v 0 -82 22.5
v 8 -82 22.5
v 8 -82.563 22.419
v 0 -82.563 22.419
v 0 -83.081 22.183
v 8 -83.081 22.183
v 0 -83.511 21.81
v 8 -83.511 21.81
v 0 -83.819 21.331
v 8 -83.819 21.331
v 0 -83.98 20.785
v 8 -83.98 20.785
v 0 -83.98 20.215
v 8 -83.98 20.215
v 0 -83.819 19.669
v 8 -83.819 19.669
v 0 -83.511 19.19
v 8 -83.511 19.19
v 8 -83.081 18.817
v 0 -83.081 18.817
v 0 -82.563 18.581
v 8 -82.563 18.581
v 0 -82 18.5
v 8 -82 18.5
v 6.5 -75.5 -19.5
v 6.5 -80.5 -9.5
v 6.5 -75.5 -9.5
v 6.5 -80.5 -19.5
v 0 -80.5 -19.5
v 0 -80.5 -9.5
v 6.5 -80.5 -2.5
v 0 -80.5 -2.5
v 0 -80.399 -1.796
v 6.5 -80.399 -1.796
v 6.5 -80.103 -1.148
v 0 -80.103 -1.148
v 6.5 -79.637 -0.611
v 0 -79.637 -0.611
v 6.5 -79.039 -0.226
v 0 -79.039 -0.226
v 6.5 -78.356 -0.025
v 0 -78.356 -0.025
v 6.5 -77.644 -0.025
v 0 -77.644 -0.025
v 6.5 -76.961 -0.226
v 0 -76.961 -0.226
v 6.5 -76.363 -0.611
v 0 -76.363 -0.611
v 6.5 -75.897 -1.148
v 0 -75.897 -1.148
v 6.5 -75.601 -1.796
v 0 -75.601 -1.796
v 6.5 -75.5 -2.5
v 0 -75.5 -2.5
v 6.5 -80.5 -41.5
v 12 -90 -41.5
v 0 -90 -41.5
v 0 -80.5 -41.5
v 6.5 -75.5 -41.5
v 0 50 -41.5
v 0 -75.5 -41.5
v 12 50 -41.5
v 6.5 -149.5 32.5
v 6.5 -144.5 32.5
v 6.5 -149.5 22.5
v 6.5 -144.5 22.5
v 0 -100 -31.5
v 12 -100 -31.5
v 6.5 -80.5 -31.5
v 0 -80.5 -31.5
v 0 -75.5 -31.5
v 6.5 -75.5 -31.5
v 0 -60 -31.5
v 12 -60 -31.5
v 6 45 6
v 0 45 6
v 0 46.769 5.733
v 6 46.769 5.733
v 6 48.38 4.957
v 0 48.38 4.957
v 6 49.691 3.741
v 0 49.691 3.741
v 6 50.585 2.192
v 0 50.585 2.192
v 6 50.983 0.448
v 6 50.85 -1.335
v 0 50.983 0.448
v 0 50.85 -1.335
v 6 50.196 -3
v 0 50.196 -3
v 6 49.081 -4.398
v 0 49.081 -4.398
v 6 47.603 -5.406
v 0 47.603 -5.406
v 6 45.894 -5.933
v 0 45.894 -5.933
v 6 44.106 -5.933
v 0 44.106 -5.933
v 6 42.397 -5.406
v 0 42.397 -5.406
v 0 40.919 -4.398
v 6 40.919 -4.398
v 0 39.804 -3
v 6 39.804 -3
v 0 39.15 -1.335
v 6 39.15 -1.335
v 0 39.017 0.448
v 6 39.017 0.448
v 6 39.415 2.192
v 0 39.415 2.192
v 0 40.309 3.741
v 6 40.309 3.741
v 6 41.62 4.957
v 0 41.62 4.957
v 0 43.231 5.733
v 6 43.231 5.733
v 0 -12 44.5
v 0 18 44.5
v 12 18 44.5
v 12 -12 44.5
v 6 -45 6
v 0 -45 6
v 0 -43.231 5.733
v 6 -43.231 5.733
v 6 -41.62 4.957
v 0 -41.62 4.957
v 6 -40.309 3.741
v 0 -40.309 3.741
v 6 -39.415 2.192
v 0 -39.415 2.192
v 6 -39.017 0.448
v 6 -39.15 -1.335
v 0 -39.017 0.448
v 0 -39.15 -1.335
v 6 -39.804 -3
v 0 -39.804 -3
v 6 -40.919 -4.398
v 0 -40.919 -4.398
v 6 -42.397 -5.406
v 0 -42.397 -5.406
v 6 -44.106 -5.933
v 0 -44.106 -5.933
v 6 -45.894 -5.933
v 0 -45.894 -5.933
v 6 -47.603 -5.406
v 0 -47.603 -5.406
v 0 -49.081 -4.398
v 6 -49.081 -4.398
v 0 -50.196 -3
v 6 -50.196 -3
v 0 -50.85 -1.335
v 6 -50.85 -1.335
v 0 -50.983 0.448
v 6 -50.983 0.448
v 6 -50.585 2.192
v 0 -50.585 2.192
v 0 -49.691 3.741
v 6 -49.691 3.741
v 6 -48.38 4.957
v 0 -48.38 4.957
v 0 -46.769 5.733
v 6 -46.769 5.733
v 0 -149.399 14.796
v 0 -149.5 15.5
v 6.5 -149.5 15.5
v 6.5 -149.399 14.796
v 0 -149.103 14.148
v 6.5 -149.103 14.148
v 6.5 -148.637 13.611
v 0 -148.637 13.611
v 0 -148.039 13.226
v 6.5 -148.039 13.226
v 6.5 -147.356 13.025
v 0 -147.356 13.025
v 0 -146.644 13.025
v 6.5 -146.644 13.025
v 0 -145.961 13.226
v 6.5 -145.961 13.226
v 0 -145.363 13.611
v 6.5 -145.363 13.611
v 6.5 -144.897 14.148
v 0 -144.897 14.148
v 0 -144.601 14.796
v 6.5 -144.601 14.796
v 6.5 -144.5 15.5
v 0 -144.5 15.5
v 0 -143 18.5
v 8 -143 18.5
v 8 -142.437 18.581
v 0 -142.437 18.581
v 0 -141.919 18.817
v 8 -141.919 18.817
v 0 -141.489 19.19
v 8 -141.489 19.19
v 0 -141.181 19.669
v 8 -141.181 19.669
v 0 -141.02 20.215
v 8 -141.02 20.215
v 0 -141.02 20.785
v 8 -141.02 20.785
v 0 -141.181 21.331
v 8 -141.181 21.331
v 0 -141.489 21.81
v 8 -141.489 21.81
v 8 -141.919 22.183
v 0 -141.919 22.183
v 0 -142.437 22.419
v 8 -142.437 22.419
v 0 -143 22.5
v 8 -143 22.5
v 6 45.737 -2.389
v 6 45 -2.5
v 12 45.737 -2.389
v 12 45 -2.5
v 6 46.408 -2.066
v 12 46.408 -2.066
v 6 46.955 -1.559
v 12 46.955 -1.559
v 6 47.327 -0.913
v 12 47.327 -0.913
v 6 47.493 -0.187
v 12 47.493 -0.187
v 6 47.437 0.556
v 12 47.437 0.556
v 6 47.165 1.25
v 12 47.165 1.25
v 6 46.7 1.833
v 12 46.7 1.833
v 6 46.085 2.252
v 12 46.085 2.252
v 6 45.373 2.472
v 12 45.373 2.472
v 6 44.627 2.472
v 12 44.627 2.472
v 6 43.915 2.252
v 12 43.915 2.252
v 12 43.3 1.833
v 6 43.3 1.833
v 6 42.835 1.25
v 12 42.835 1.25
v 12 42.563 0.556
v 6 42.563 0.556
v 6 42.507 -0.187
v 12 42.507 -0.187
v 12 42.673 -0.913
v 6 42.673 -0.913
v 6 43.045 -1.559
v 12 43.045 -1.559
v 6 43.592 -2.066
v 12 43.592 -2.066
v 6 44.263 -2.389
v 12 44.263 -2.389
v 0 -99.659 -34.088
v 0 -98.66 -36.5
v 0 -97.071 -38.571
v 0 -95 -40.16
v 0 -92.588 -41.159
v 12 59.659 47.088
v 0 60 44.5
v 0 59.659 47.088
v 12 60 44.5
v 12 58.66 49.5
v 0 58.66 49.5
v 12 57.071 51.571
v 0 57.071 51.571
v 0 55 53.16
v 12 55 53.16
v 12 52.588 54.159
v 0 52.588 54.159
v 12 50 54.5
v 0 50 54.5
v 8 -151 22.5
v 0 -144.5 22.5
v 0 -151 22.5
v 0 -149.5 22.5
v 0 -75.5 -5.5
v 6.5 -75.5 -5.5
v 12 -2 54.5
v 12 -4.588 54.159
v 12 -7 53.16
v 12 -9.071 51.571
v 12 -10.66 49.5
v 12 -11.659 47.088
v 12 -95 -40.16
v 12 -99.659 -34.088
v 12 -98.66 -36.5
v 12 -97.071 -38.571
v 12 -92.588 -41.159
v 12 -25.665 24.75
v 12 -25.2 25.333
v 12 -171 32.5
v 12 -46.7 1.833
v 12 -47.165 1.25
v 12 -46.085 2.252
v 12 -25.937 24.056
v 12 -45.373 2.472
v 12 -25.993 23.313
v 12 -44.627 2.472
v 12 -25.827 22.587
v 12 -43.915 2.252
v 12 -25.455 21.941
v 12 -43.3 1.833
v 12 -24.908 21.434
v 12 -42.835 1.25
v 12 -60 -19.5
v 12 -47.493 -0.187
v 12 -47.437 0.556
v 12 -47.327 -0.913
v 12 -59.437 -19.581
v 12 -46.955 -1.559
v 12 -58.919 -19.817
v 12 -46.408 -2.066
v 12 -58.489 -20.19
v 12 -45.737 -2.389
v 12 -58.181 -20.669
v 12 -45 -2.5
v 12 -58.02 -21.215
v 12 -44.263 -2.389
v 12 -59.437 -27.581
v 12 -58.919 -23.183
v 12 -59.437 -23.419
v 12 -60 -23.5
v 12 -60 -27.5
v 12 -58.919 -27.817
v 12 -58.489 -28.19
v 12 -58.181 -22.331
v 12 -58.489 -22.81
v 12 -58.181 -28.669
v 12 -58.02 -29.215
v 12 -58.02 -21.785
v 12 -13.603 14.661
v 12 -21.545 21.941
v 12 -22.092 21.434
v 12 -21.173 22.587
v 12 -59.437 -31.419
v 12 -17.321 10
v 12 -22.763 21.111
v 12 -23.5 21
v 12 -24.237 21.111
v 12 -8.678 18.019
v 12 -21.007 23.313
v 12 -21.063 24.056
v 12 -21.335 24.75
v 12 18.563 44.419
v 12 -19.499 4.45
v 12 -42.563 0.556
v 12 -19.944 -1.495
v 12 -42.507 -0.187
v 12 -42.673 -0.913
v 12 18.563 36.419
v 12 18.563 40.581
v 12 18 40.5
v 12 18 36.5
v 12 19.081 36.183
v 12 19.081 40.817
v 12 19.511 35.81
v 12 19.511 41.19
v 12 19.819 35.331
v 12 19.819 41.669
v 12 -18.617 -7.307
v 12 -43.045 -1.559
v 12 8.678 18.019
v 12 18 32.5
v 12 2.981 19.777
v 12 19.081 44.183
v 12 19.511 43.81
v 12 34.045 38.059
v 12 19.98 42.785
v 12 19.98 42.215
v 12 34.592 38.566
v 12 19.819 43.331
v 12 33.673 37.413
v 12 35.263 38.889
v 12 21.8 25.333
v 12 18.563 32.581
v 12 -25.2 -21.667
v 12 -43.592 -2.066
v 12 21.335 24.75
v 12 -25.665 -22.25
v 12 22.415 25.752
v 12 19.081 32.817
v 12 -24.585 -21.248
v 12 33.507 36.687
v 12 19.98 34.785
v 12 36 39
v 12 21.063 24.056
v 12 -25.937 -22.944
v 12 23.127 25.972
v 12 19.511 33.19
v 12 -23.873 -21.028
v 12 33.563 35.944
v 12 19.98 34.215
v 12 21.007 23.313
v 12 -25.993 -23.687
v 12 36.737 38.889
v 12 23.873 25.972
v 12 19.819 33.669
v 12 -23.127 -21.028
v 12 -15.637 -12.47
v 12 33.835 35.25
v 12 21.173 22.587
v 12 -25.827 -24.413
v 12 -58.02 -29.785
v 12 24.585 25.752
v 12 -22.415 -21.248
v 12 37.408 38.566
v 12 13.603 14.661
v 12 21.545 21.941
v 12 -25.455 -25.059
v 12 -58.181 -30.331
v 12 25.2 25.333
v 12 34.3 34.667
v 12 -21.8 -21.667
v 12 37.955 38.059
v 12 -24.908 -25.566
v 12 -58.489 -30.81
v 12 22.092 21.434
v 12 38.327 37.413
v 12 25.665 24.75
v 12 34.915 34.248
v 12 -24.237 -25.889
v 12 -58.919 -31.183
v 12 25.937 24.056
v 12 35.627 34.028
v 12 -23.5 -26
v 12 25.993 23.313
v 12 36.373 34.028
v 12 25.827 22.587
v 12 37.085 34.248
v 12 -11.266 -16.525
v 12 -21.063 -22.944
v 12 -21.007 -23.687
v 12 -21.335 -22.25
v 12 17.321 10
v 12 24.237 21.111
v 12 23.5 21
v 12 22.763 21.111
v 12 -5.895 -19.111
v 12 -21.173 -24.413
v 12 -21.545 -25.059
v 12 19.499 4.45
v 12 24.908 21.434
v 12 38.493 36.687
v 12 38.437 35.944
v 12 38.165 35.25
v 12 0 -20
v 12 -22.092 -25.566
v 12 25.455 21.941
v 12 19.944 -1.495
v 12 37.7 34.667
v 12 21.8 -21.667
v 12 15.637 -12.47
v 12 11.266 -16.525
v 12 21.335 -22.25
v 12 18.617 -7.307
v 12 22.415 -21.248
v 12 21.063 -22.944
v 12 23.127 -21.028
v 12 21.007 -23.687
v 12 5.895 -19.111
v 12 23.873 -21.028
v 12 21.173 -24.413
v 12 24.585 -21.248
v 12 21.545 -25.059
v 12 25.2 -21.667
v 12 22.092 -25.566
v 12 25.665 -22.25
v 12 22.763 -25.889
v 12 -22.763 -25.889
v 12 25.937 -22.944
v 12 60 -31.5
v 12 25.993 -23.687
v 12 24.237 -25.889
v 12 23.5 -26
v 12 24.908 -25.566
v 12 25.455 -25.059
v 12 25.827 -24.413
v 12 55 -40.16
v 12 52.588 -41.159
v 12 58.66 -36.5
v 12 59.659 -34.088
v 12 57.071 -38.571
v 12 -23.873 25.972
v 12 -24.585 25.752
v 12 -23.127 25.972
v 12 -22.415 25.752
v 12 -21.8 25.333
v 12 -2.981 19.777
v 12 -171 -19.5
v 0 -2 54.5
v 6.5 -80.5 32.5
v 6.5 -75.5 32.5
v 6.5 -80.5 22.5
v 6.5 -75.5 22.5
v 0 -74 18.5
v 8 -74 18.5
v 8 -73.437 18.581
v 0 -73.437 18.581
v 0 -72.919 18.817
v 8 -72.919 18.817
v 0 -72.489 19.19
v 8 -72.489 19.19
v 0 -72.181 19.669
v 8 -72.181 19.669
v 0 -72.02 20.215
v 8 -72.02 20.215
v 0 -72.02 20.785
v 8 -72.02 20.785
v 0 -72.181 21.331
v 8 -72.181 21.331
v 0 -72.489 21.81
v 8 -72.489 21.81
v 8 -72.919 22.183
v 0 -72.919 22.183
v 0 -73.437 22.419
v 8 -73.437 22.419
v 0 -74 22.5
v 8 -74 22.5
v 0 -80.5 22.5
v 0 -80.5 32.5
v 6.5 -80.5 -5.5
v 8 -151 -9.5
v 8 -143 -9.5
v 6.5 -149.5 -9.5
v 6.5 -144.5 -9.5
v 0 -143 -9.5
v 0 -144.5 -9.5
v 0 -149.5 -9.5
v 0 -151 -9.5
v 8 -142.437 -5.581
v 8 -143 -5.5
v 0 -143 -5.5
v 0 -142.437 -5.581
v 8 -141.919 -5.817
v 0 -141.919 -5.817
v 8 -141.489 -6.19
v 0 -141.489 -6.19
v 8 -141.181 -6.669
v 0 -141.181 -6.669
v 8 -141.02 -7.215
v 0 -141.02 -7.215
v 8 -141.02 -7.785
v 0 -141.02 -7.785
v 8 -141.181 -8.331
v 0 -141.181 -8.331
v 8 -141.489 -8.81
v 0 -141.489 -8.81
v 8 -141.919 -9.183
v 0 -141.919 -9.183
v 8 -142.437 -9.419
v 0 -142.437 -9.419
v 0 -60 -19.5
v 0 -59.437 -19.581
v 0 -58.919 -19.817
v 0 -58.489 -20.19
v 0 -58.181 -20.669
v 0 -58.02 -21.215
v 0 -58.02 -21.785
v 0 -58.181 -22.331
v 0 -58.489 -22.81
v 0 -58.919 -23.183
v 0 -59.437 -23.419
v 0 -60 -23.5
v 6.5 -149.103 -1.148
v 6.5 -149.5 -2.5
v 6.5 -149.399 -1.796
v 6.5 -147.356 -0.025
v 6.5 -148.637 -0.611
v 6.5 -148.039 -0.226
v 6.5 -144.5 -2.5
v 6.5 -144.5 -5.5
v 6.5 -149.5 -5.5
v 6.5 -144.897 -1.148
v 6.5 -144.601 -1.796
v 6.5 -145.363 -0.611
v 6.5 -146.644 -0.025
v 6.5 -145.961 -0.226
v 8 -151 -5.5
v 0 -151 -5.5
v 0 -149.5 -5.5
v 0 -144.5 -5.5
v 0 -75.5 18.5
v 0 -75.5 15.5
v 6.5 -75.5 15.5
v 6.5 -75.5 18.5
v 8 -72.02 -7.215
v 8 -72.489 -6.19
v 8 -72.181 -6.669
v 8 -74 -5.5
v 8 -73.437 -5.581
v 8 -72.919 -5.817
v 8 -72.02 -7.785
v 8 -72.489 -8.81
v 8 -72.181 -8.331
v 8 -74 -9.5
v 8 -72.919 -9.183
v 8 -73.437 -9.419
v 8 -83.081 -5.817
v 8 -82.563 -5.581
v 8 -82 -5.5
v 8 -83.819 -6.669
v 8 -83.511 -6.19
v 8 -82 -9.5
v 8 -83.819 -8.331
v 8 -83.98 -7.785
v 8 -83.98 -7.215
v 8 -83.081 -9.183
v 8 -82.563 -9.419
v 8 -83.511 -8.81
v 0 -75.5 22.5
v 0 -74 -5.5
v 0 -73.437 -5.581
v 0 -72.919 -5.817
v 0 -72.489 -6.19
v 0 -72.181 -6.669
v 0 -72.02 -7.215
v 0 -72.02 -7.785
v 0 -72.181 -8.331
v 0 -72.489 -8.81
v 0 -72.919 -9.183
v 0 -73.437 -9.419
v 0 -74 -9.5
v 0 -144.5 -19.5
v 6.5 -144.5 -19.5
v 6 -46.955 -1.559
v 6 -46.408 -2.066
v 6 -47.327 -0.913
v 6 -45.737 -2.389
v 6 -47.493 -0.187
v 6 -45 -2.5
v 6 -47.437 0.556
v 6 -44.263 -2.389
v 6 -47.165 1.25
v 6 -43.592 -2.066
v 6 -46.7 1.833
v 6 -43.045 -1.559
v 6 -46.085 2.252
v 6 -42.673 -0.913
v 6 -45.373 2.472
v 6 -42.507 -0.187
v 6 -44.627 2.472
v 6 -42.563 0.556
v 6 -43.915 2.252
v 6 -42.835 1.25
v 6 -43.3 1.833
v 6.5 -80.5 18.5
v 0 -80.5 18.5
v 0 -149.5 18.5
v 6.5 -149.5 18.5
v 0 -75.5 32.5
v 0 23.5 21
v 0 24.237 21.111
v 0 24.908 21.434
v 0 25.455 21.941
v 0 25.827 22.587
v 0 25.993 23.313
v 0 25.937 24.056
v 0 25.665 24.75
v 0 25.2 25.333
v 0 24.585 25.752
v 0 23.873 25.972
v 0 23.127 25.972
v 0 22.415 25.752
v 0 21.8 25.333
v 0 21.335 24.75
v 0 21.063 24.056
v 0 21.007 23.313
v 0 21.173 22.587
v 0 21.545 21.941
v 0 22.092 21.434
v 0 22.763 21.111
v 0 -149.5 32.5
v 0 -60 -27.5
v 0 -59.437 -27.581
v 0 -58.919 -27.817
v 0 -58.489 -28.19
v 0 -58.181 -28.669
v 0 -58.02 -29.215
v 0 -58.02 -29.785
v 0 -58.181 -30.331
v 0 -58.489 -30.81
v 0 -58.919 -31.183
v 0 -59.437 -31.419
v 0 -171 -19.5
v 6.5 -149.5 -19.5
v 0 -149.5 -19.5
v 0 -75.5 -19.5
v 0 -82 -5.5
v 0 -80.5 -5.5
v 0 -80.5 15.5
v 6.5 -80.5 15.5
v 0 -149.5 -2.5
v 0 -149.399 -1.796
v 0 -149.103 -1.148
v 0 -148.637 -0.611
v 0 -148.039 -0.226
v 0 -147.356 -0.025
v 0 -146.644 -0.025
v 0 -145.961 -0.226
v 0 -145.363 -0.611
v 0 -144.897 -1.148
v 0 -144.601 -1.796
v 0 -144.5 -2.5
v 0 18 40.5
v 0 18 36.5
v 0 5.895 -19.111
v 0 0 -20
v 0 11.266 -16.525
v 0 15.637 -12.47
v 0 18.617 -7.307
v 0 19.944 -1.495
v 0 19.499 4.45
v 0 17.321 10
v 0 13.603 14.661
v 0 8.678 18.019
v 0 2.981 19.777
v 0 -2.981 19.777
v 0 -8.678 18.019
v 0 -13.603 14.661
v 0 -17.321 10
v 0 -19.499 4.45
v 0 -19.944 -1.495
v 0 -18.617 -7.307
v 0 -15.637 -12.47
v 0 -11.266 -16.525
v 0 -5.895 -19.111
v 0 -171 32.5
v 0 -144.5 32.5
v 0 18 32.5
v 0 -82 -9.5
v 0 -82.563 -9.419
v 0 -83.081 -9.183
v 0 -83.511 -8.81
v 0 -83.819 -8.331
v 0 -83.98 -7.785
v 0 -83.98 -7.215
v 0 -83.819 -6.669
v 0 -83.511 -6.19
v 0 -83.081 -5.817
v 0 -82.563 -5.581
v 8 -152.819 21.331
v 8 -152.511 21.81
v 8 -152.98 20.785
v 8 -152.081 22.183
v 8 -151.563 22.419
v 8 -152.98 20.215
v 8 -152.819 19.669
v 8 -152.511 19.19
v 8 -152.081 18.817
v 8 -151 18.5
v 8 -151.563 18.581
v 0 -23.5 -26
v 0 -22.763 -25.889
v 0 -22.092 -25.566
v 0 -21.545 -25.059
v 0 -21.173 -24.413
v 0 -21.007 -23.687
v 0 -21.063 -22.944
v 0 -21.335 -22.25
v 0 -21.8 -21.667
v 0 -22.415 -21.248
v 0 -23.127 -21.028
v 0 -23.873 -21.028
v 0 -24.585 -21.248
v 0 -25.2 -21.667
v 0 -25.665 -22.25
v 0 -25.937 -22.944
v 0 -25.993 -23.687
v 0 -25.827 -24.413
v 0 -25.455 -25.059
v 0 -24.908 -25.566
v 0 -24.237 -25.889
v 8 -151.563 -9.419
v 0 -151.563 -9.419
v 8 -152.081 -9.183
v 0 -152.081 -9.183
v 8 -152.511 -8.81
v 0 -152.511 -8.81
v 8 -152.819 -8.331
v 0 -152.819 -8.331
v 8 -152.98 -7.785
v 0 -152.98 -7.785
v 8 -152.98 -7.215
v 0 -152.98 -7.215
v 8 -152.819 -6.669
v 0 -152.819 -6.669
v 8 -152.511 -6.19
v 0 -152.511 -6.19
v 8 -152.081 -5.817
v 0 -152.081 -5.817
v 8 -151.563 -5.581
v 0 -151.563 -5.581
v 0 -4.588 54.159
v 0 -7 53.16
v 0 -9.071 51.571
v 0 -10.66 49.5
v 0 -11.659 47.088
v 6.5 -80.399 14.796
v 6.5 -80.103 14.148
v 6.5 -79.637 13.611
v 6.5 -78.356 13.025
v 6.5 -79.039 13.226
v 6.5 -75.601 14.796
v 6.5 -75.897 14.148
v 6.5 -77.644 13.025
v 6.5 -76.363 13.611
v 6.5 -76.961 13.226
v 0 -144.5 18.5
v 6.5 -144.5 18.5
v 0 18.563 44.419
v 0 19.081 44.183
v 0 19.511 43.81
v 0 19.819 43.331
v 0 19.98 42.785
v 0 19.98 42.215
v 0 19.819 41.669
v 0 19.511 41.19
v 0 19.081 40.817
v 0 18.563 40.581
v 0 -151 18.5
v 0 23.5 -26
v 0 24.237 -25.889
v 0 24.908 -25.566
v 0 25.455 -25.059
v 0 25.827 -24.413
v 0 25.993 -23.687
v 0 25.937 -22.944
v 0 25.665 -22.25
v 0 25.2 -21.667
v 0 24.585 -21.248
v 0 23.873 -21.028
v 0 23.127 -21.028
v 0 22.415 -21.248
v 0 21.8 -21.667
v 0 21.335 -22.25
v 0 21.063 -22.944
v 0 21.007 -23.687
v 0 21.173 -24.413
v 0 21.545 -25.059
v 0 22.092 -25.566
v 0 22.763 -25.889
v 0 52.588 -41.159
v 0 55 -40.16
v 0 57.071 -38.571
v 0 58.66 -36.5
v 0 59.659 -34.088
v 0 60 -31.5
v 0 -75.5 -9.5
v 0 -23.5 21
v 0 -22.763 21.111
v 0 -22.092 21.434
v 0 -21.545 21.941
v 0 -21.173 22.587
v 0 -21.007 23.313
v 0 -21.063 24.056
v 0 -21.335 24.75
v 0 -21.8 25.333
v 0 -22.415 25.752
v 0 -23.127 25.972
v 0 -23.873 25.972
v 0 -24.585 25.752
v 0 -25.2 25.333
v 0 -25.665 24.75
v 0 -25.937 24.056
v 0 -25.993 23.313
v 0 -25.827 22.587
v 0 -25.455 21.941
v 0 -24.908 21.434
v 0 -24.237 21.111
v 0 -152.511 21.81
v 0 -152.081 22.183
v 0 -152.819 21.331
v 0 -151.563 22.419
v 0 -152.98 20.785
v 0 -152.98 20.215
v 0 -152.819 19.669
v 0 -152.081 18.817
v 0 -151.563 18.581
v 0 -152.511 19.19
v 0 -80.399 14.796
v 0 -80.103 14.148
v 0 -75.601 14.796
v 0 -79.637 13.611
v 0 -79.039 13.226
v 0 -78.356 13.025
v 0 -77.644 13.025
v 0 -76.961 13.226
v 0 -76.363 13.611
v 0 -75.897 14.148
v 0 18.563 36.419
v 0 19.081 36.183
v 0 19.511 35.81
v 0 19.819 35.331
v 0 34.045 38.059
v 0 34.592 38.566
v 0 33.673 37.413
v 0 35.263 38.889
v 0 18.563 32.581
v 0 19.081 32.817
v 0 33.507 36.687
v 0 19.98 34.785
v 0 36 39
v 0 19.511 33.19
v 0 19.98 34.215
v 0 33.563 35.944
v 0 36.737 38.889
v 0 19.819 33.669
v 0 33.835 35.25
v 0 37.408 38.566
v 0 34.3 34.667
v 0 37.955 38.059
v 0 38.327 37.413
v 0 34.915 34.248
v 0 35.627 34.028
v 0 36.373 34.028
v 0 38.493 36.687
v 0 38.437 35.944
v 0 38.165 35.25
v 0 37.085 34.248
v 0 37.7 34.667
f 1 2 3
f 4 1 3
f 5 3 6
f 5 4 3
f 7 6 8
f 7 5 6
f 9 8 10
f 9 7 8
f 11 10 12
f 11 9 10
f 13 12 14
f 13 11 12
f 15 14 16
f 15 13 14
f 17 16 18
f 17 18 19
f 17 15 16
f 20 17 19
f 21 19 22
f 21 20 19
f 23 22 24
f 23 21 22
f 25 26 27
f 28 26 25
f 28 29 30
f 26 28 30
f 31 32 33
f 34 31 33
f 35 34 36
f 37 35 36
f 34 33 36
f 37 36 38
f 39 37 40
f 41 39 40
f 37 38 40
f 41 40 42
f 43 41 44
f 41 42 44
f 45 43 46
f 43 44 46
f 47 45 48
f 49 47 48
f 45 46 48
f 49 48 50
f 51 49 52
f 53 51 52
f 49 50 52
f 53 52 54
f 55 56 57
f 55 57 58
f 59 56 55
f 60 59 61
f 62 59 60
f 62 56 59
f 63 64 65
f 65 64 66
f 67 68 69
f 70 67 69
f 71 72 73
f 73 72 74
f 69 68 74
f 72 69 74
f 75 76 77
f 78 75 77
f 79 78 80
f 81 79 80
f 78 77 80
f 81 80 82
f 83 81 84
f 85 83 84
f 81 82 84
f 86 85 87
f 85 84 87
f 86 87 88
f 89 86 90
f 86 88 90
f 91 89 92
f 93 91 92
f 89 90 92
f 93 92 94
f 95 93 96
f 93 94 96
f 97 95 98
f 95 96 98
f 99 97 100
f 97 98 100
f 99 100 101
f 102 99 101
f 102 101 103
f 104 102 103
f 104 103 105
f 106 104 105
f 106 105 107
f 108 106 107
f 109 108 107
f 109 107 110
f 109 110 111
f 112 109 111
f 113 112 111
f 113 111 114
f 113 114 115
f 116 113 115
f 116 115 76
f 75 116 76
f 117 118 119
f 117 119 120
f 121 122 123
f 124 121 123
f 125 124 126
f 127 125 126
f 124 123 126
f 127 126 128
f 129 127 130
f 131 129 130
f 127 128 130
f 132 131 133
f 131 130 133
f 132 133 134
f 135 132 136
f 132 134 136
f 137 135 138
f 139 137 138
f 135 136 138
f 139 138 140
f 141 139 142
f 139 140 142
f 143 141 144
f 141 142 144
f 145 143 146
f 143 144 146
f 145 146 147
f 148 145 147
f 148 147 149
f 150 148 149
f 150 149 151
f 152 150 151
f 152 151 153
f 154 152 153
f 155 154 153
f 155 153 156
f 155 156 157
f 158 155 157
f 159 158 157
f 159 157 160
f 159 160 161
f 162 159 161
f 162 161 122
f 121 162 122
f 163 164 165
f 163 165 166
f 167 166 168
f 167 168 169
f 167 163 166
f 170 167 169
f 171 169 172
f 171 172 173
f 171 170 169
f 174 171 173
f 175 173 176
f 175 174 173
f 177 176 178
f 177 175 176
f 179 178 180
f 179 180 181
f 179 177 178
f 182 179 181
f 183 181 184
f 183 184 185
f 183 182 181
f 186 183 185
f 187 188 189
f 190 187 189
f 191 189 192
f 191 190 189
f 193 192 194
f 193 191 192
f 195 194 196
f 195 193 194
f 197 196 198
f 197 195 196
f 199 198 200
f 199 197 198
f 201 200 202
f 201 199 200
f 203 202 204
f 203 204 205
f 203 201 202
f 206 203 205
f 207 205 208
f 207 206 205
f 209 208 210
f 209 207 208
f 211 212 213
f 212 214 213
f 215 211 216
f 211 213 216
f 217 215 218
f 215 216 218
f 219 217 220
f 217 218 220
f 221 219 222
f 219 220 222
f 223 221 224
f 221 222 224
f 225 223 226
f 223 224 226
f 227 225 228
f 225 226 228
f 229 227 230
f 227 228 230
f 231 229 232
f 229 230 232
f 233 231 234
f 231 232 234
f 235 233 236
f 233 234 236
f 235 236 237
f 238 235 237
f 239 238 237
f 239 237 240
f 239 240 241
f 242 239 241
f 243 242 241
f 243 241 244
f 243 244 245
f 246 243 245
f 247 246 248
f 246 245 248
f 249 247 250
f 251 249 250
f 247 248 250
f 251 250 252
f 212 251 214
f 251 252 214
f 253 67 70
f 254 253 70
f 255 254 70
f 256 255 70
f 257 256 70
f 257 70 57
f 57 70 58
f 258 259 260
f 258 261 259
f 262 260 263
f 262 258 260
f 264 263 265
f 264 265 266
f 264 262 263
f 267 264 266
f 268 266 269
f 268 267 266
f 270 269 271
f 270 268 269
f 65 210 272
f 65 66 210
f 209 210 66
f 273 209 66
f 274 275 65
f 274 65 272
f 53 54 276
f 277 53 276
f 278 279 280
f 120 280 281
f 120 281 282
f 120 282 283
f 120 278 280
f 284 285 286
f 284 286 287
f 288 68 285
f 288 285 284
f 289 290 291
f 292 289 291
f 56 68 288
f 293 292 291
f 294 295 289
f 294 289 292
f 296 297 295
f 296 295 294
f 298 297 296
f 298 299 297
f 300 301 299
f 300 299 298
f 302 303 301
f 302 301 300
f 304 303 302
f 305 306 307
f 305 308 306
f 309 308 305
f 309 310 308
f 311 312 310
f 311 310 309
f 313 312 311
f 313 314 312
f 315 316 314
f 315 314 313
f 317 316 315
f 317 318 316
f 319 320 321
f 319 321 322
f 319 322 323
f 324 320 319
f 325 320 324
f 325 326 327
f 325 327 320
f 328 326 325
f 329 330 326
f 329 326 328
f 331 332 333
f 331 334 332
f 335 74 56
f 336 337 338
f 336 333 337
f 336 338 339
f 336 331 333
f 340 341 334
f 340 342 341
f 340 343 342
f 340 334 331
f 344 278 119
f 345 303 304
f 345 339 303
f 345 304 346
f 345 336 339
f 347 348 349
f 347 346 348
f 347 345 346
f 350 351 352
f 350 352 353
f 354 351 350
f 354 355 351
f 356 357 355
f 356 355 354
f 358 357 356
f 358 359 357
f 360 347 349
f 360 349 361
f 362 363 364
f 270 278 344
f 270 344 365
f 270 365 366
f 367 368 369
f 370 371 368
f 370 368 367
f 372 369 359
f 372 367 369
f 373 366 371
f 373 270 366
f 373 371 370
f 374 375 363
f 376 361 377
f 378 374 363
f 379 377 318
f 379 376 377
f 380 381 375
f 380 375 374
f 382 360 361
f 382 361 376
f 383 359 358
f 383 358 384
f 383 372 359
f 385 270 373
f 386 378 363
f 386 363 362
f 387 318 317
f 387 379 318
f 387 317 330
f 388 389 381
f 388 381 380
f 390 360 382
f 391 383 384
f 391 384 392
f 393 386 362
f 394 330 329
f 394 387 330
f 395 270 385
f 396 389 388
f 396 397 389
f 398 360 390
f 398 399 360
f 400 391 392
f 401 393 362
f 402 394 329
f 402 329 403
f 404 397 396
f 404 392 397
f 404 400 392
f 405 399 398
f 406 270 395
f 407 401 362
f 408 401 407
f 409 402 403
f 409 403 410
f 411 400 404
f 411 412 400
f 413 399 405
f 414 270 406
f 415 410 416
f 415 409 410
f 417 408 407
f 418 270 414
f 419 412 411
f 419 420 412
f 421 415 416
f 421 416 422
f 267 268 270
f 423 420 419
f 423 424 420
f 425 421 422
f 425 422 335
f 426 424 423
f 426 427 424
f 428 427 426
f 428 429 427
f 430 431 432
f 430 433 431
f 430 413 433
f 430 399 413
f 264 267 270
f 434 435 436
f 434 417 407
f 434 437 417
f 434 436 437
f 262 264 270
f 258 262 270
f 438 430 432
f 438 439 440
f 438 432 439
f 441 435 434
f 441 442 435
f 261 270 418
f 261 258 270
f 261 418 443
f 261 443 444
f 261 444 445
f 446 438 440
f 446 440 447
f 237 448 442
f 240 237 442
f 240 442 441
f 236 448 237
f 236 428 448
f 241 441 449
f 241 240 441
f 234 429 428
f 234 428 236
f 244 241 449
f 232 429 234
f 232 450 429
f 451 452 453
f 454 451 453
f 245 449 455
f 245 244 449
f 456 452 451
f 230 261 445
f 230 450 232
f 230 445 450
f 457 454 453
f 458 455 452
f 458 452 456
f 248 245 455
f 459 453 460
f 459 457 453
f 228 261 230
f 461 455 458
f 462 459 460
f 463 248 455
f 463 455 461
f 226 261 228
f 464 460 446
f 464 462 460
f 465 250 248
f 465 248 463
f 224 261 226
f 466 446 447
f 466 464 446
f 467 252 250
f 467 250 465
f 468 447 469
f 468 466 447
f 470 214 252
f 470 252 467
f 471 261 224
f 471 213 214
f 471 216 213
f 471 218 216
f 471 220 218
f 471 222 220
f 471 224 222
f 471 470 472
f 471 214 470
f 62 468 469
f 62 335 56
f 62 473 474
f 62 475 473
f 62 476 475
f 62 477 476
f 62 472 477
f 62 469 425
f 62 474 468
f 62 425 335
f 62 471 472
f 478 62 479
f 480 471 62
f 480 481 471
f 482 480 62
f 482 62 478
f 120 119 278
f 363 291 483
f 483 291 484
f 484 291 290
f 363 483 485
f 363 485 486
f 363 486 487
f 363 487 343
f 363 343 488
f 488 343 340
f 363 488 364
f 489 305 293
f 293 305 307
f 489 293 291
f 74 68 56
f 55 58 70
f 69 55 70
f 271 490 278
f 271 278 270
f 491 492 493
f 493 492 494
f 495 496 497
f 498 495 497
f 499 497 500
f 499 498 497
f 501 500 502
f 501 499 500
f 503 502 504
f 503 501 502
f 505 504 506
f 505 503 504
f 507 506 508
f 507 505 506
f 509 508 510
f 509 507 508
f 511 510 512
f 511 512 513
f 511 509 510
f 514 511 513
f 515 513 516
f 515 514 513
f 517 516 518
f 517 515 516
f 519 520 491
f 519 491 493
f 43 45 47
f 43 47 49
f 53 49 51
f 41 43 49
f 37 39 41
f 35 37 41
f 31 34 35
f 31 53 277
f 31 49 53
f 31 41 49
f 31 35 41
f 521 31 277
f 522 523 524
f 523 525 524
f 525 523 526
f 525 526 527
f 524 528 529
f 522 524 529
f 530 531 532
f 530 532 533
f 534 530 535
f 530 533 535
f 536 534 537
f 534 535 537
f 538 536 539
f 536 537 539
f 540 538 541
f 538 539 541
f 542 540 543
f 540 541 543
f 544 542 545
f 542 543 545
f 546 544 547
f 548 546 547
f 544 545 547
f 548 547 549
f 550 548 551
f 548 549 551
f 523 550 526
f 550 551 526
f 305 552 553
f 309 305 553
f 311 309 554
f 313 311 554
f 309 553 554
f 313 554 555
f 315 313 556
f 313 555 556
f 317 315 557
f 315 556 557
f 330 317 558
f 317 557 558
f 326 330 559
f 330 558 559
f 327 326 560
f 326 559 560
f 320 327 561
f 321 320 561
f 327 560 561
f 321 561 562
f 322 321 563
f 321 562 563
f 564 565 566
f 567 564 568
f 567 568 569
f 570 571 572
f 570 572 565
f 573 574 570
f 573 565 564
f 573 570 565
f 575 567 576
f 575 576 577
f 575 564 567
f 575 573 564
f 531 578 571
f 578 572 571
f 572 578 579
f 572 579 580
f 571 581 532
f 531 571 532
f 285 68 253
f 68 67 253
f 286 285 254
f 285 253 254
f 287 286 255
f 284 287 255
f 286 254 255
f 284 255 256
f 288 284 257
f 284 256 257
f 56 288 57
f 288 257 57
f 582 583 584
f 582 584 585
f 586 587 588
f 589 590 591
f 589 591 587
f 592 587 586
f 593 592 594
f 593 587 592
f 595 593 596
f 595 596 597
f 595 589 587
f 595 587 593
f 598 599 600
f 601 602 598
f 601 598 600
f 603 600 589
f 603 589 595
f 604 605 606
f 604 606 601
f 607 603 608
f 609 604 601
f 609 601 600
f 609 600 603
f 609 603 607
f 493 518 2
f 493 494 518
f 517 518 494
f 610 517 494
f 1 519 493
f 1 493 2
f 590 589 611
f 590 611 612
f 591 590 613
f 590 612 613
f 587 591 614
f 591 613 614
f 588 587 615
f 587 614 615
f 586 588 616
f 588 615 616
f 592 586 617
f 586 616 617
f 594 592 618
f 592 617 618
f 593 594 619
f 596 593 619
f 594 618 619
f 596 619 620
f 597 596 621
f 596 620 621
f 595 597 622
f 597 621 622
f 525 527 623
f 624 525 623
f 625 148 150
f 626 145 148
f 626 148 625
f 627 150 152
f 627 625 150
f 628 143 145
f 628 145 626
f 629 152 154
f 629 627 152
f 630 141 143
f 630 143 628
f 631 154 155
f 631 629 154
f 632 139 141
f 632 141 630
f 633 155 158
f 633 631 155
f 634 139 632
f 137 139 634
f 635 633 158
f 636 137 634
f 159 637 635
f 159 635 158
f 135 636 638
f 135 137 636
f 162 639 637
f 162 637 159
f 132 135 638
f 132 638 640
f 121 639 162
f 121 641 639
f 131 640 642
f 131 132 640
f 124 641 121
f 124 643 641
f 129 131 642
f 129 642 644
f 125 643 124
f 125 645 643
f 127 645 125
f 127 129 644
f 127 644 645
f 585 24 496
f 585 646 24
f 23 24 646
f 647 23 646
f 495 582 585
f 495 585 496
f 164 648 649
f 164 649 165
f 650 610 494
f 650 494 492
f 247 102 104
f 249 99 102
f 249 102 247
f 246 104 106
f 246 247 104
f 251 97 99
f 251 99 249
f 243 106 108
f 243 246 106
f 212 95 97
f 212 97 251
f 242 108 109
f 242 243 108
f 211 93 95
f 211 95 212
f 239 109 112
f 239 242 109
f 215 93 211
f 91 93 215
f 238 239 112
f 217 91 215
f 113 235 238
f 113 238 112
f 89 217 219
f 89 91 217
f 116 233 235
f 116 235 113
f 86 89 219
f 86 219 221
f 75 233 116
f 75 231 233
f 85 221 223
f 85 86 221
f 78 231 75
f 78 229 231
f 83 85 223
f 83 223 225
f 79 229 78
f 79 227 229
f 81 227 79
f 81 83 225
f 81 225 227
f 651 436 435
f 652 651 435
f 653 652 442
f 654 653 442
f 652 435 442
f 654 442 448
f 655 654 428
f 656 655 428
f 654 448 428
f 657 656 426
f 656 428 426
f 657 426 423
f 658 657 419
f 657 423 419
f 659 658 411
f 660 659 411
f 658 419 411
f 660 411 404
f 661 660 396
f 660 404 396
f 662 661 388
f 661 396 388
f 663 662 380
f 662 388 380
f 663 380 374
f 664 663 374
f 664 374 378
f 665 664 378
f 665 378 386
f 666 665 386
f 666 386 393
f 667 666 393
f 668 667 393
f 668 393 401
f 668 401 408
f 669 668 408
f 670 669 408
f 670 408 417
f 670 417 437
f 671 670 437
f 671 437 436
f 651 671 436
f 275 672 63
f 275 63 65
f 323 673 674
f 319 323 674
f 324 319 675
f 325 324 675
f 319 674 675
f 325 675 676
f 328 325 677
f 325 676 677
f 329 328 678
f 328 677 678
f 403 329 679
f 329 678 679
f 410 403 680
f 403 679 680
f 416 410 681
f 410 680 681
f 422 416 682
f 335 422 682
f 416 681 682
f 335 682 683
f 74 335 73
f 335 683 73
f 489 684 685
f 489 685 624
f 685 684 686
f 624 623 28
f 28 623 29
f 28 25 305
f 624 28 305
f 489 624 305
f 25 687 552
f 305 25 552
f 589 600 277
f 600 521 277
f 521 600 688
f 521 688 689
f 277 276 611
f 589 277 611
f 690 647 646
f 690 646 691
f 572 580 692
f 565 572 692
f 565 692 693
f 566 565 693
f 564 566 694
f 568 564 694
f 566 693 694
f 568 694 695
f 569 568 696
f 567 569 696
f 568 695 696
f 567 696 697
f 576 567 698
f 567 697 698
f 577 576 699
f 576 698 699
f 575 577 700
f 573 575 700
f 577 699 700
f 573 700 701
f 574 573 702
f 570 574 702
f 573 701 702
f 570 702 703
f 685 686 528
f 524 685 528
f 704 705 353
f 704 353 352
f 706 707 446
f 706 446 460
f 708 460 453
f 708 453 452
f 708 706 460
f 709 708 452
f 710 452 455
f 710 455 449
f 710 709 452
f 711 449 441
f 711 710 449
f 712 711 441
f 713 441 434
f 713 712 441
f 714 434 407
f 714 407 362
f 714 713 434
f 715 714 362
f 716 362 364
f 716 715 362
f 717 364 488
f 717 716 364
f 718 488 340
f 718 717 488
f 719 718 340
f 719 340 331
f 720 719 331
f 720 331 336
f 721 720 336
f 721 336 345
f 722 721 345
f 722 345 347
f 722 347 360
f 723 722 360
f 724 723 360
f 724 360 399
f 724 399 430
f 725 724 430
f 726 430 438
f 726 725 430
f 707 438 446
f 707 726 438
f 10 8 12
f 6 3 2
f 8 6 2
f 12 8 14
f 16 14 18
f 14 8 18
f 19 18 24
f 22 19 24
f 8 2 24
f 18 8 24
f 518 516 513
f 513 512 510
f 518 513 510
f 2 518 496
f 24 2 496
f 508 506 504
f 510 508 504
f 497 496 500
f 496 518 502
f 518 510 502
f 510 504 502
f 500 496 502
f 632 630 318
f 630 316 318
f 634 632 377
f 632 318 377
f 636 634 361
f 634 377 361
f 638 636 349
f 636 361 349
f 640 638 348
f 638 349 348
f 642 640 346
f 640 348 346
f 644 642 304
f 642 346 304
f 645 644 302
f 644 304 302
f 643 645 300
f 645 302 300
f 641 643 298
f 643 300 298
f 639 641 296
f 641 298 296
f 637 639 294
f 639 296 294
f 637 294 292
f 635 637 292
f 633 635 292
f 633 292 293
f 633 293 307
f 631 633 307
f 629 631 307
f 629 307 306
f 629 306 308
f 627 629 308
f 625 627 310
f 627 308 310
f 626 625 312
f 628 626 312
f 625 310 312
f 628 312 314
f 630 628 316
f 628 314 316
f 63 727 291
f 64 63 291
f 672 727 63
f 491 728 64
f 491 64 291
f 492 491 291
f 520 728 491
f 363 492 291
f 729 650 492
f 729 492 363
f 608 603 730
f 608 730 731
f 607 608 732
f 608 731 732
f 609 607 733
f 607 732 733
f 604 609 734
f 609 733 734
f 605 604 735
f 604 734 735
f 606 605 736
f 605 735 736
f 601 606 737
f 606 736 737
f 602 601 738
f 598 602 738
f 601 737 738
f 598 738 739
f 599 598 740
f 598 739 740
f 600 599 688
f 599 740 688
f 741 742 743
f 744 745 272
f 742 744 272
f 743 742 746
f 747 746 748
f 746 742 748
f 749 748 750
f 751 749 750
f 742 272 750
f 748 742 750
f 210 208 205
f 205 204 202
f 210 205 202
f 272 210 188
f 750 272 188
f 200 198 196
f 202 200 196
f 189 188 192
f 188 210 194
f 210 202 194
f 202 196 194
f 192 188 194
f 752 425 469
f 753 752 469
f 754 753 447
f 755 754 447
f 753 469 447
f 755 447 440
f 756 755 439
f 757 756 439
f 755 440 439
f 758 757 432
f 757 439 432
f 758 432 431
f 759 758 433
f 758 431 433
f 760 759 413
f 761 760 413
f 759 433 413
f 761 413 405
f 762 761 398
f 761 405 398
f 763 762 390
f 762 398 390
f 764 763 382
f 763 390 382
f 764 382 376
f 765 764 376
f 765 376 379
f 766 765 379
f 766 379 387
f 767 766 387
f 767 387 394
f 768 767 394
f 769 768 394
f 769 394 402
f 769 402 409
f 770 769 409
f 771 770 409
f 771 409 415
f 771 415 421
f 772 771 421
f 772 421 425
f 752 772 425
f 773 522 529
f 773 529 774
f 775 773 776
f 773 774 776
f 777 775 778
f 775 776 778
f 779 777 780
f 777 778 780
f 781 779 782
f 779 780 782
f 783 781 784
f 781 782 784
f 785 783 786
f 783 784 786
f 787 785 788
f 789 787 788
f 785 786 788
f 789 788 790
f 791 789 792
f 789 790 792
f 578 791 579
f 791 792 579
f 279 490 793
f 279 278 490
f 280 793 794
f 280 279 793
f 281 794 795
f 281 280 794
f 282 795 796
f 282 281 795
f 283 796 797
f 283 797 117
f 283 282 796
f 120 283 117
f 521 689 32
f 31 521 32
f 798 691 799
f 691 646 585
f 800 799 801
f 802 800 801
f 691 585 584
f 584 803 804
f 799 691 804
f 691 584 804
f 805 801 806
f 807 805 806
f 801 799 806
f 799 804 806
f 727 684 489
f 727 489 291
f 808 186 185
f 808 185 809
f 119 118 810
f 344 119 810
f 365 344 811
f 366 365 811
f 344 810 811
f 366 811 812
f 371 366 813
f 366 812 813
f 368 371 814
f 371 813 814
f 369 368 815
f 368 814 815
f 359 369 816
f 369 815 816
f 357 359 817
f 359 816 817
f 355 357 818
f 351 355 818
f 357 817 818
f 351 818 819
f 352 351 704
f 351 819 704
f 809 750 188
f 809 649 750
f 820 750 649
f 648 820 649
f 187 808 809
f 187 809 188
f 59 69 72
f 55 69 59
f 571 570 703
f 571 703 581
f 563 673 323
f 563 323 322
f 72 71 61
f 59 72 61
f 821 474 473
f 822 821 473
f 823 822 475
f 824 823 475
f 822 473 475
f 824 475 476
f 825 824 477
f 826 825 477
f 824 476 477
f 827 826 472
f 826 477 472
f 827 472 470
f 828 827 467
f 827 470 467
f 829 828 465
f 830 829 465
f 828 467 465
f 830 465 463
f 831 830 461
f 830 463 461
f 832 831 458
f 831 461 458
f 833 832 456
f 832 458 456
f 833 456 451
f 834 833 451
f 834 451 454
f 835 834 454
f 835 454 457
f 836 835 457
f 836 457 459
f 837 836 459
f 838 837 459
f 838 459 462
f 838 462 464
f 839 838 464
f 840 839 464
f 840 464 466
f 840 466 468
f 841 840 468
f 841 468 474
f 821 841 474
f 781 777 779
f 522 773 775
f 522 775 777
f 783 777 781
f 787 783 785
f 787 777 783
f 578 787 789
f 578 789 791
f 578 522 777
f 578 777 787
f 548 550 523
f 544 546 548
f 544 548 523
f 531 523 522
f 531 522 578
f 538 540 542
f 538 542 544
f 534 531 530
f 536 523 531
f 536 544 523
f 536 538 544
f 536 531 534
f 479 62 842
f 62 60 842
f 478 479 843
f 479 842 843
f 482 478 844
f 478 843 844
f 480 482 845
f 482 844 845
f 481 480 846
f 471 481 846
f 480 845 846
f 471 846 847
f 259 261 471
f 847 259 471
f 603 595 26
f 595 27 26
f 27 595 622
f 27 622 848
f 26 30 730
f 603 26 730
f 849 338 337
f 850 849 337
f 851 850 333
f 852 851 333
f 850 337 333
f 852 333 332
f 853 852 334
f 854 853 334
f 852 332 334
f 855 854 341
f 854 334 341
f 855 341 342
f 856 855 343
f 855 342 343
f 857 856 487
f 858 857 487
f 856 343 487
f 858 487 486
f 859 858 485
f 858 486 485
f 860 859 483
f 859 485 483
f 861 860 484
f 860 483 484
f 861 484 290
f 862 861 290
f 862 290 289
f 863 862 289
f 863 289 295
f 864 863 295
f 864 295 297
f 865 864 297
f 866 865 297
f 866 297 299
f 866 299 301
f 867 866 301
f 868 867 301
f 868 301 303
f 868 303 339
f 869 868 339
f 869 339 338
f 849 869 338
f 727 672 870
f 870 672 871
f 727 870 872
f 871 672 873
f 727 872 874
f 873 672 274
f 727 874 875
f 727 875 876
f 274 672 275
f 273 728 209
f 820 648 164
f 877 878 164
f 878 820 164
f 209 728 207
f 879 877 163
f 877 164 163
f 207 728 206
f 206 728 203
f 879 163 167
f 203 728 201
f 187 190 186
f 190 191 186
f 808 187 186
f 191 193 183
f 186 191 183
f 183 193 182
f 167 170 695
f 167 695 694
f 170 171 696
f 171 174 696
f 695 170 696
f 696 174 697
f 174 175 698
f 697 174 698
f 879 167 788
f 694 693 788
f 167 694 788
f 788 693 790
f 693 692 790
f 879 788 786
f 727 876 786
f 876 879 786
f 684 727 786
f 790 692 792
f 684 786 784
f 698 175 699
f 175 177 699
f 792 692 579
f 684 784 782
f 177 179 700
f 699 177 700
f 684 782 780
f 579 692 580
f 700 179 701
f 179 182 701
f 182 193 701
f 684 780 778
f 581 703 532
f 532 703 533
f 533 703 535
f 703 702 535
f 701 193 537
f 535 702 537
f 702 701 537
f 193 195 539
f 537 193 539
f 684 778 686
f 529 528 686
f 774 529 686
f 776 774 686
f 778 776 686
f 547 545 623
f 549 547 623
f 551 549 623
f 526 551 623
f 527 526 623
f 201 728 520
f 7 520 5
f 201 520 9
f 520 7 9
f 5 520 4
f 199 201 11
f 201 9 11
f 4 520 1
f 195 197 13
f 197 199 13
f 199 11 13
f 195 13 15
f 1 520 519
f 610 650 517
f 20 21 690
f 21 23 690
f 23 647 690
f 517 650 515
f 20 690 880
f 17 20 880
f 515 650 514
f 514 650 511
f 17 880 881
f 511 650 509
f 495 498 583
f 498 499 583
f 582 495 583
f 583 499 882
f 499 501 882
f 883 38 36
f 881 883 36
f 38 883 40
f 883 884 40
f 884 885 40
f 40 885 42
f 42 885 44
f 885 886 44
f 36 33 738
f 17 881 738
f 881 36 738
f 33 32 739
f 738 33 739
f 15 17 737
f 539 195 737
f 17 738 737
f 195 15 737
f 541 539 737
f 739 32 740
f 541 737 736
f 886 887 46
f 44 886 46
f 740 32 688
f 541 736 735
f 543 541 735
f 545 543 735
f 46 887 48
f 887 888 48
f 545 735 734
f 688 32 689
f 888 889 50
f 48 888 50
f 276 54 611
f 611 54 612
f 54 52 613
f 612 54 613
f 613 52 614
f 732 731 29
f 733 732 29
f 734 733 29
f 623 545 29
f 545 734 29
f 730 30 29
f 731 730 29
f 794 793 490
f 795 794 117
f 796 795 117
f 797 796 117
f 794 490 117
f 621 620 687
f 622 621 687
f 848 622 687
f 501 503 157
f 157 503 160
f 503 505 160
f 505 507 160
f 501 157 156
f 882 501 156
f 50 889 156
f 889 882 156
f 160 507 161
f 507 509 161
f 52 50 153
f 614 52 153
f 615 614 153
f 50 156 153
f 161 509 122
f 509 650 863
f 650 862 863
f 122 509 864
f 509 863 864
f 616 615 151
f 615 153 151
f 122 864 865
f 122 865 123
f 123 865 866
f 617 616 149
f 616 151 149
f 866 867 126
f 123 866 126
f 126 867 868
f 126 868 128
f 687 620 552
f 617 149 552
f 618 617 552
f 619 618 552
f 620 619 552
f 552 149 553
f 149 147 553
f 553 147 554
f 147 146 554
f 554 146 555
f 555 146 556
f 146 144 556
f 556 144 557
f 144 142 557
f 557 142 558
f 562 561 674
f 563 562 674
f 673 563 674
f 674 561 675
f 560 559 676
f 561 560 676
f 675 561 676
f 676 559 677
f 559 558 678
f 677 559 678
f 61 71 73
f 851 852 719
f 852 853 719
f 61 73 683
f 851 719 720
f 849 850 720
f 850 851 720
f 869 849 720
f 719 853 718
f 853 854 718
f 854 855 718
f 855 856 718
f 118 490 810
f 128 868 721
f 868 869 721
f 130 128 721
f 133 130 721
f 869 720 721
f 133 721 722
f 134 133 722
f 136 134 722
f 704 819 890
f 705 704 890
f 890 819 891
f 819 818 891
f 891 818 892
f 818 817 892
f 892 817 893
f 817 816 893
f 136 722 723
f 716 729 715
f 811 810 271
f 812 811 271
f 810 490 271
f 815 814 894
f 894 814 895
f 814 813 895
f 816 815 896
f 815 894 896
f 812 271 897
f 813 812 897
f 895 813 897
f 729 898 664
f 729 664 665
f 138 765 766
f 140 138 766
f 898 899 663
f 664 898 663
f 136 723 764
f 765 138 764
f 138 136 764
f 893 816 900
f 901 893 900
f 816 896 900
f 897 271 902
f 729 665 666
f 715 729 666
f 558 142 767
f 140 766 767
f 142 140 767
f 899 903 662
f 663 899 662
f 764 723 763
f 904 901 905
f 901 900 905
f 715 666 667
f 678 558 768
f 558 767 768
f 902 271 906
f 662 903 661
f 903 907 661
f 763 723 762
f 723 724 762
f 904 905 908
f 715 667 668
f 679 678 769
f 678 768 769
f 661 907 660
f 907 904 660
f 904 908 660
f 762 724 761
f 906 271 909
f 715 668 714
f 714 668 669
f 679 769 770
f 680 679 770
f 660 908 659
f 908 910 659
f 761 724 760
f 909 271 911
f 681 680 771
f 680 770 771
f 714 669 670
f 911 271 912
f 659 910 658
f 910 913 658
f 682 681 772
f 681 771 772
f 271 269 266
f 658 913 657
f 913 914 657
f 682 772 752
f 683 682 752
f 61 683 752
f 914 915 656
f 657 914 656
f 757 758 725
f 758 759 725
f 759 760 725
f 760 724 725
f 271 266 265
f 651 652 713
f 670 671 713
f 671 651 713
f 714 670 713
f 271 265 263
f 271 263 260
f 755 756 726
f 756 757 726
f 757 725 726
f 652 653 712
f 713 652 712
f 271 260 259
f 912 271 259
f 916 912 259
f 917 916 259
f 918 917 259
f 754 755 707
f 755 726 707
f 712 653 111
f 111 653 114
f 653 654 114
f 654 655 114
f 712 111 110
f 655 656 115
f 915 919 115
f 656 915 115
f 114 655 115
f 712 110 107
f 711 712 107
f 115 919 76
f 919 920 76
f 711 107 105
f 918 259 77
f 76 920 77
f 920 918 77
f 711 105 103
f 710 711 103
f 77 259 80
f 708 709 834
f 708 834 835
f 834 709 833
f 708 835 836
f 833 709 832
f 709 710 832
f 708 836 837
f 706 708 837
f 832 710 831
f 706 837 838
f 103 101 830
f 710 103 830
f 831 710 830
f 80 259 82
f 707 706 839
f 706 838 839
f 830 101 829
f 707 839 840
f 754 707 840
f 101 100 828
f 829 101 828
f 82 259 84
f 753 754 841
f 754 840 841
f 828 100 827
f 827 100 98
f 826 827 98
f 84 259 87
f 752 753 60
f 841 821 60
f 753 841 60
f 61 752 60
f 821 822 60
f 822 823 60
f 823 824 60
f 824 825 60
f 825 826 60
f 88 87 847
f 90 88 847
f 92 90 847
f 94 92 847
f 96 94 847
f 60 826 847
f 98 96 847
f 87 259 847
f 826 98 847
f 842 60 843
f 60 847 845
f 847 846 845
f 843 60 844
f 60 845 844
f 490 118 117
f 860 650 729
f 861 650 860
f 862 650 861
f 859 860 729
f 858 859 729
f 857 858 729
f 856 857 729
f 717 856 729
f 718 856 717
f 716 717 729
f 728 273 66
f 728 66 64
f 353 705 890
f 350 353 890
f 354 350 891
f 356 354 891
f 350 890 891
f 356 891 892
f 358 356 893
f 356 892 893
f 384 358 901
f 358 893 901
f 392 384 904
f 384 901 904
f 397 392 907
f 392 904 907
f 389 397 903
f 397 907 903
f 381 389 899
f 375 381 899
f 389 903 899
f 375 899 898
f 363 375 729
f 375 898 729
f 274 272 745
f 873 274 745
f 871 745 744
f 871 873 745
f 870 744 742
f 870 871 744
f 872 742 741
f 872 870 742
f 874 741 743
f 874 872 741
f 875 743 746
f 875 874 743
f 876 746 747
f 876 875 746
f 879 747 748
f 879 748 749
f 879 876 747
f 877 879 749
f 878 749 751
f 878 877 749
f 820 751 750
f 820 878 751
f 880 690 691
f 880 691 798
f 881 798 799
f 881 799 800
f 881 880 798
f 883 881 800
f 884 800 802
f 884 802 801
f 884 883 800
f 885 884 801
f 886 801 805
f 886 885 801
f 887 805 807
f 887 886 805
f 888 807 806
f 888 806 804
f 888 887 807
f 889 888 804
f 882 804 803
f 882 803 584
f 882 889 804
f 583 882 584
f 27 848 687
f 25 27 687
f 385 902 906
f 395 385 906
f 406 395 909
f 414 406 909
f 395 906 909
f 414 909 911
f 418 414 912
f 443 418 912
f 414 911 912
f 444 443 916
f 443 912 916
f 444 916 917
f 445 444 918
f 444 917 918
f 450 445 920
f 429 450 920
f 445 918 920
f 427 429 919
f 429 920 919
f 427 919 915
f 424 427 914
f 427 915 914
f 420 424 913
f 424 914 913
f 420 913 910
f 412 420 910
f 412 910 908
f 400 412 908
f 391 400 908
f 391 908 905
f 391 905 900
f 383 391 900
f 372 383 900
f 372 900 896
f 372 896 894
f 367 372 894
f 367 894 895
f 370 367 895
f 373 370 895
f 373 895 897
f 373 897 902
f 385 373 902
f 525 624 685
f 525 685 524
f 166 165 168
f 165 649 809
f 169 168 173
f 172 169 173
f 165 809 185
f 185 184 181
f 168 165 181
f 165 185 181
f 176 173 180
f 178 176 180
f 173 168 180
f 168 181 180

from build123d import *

# Parameters (mm, degrees)
SKETCH1_W                          = 63
SKETCH1_H                          = 120
SKETCH1_R                          = 20
BOSS_EXTRUDE1_DEPTH                = 12
F_5_0_5_DIAMETER_HOLE2_D           = 5
LINEAR_RAIL_MOUNT_HOLE_D           = 5
LINEAR_RAIL_MOUNT_HOLE_CBORE_D     = 12
LINEAR_RAIL_MOUNT_HOLE_CBORE_DEPTH = 6
BOSS_EXTRUDE2_DEPTH                = 12
SKETCH9_W                          = 52
SKETCH9_H                          = 111
BOSS_EXTRUDE3_DEPTH                = 12
SKETCH11_W                         = 10
SKETCH11_H                         = 160
BOSS_EXTRUDE4_DEPTH                = 12
F_5_0_5_DIAMETER_HOLE1_D           = 5
FILLET1_R                          = 10
CUT_EXTRUDE1_REACH                 = 181.876
CUT_EXTRUDE2_DEPTH                 = 8
CUT_EXTRUDE3_DEPTH                 = 6.5
LPATTERN1_COUNT                    = 2
LPATTERN1_PITCH                    = 69
MIRROR1_COPY_1_DEPTH               = 8
MIRROR1_COPY_2_DEPTH               = 6.5


with BuildPart() as part:
    # Sketch1 → Boss-Extrude1 (new body)
    with BuildSketch(Plane(origin=(0, 0, 0), x_dir=(0, 0, -1), z_dir=(1, 0, 0))):
        Rectangle(SKETCH1_W, SKETCH1_H)
        Circle(SKETCH1_R, mode=Mode.SUBTRACT)
    extrude(amount=BOSS_EXTRUDE1_DEPTH)

    # Ø5.0 (5) Diameter Hole2 (through all)
    with Locations(Plane.ZY):
        with Locations((-23.5, 23.5), (23.5, 23.5), (23.5, -23.5), (-23.5, -23.5)):
            Hole(F_5_0_5_DIAMETER_HOLE2_D / 2)

    # Linear Rail Mount Hole (through all)
    with Locations(Plane.ZY):
        with Locations((0, 45), (0, -45)):
            CounterBoreHole(LINEAR_RAIL_MOUNT_HOLE_D / 2, LINEAR_RAIL_MOUNT_HOLE_CBORE_D / 2, LINEAR_RAIL_MOUNT_HOLE_CBORE_DEPTH)

    # Sketch8 → Boss-Extrude2 (add)
    with BuildSketch(Plane.ZY):
        Polygon((44.5, 18), (44.5, -12), (54.5, -12), (54.5, 60), (31.5, 60), (31.5, -60), (32.5, -60), (32.5, 18), align=None)
    extrude(amount=-BOSS_EXTRUDE2_DEPTH)

    # Sketch9 → Boss-Extrude3 (add)
    with BuildSketch(Plane.ZY):
        with Locations((6.5, -115.5)):
            Rectangle(SKETCH9_W, SKETCH9_H)
    extrude(amount=-BOSS_EXTRUDE3_DEPTH)

    # Sketch11 → Boss-Extrude4 (add)
    with BuildSketch(Plane(origin=(12, 0, 0), x_dir=(0, 0, -1), z_dir=(1, 0, 0))):
        with Locations((36.5, -20)):
            Rectangle(SKETCH11_W, SKETCH11_H)
    extrude(amount=-BOSS_EXTRUDE4_DEPTH)

    # Ø5.0 (5) Diameter Hole1 (through all)
    with Locations(Plane(origin=(12, 0, 0), x_dir=(0, 0, -1), z_dir=(1, 0, 0))):
        with Locations((-36.5, 36)):
            Hole(F_5_0_5_DIAMETER_HOLE1_D / 2)

    # Fillet1
    fillet1_edges = [part.edges().sort_by_distance(p)[0] for p in [
        (6, 60, 54.5),
        (6, -12, 54.5),
        (6, -100, -41.5),
        (6, 60, -41.5),
    ]]
    fillet(fillet1_edges, radius=FILLET1_R - 0.0001)  # a hair under: the kernel refuses the full size

    # Sketch25 → Cut-Extrude1 (cut, up to next)
    with BuildSketch(Plane.ZY, mode=Mode.PRIVATE) as cut_extrude1_sk1:
        with BuildLine():
            Line((32.5, 18), (36.5, 18))
            ThreePointArc((36.5, 18), (34.5, 20), (32.5, 18))
        make_face()
    cut_extrude1_tool1 = extrude(cut_extrude1_sk1.sketch, amount=-CUT_EXTRUDE1_REACH, mode=Mode.PRIVATE) & part.part
    # Sketch25 → Cut-Extrude1 (cut, up to next)
    with BuildSketch(Plane.ZY, mode=Mode.PRIVATE) as cut_extrude1_sk2:
        with BuildLine():
            Line((40.5, 18), (44.5, 18))
            ThreePointArc((44.5, 18), (42.5, 20), (40.5, 18))
        make_face()
    cut_extrude1_tool2 = extrude(cut_extrude1_sk2.sketch, amount=-CUT_EXTRUDE1_REACH, mode=Mode.PRIVATE) & part.part
    # Sketch25 → Cut-Extrude1 (cut, up to next)
    with BuildSketch(Plane.ZY, mode=Mode.PRIVATE) as cut_extrude1_sk3:
        with BuildLine():
            Line((-31.5, -60), (-27.5, -60))
            ThreePointArc((-27.5, -60), (-29.5, -58), (-31.5, -60))
        make_face()
    cut_extrude1_tool3 = extrude(cut_extrude1_sk3.sketch, amount=-CUT_EXTRUDE1_REACH, mode=Mode.PRIVATE) & part.part
    # Sketch25 → Cut-Extrude1 (cut, up to next)
    with BuildSketch(Plane.ZY, mode=Mode.PRIVATE) as cut_extrude1_sk4:
        with BuildLine():
            Line((-23.5, -60), (-19.5, -60))
            ThreePointArc((-19.5, -60), (-21.5, -58), (-23.5, -60))
        make_face()
    cut_extrude1_tool4 = extrude(cut_extrude1_sk4.sketch, amount=-CUT_EXTRUDE1_REACH, mode=Mode.PRIVATE) & part.part
    add(cut_extrude1_tool1.solids().sort_by_distance((0, 18.848826, 34.5))[0], mode=Mode.SUBTRACT)
    add(cut_extrude1_tool2.solids().sort_by_distance((0, 18.848826, 42.5))[0], mode=Mode.SUBTRACT)
    add(cut_extrude1_tool3.solids().sort_by_distance((0, -59.151174, -29.5))[0], mode=Mode.SUBTRACT)
    add(cut_extrude1_tool4.solids().sort_by_distance((0, -59.151174, -21.5))[0], mode=Mode.SUBTRACT)

    # Sketch27 → Cut-Extrude2 (cut)
    with BuildSketch(Plane(origin=(0, 35.243272034, 16.659279863), x_dir=(0, 0, 1), z_dir=(-1, 0, 0))):
        with BuildLine():
            Line((5.840720137, -178.243272034), (5.840720137, -186.243272034))
            ThreePointArc((5.840720137, -186.243272034), (3.840720137, -188.243272034), (1.840720137, -186.243272034))
            Line((1.840720137, -186.243272034), (1.840720137, -178.243272034))
            ThreePointArc((1.840720137, -178.243272034), (3.840720137, -176.243272034), (5.840720137, -178.243272034))
        make_face()
    cut_extrude2 = extrude(amount=-CUT_EXTRUDE2_DEPTH, mode=Mode.SUBTRACT)

    # Sketch29 → Cut-Extrude3 (cut)
    with BuildSketch(Plane(origin=(0, 35.243272034, 16.659279863), x_dir=(0, 0, 1), z_dir=(-1, 0, 0))):
        with BuildLine():
            Line((61.738206335, -184.743272034), (-1.159279863, -184.743272034))
            ThreePointArc((-1.159279863, -184.743272034), (-3.659279863, -182.243272034), (-1.159279863, -179.743272034))
            Line((-1.159279863, -179.743272034), (61.738206335, -179.743272034))
            ThreePointArc((61.738206335, -179.743272034), (64.238206335, -182.243272034), (61.738206335, -184.743272034))
        make_face()
    cut_extrude3 = extrude(amount=-CUT_EXTRUDE3_DEPTH, mode=Mode.SUBTRACT)

    # LPattern1: Cut-Extrude2, Cut-Extrude3 ×2
    with Locations(*[(0, i * LPATTERN1_PITCH, 0) for i in range(1, LPATTERN1_COUNT)]):
        add(cut_extrude2, mode=Mode.SUBTRACT)
        add(cut_extrude3, mode=Mode.SUBTRACT)

    # Mirror1: Cut-Extrude2, Cut-Extrude3 across plane
    add(cut_extrude2.mirror(Plane.XY.offset(6.5)), mode=Mode.SUBTRACT)
    add(cut_extrude3.mirror(Plane.XY.offset(6.5)), mode=Mode.SUBTRACT)

    # Mirror1 copy 1 sketch → Mirror1 copy 1 (cut)
    with BuildSketch(Plane(origin=(0, 104.243272034, -3.659279863), x_dir=(0, 0, -1), z_dir=(-1, 0, 0))):
        with BuildLine():
            Line((5.840720137, 178.243272034), (5.840720137, 186.243272034))
            ThreePointArc((5.840720137, 186.243272034), (3.840720137, 188.243272034), (1.840720137, 186.243272034))
            Line((1.840720137, 186.243272034), (1.840720137, 178.243272034))
            ThreePointArc((1.840720137, 178.243272034), (3.840720137, 176.243272034), (5.840720137, 178.243272034))
        make_face()
    extrude(amount=-MIRROR1_COPY_1_DEPTH, mode=Mode.SUBTRACT)

    # Mirror1 copy 2 sketch → Mirror1 copy 2 (cut)
    with BuildSketch(Plane(origin=(0, 104.243272034, -3.659279863), x_dir=(0, 0, -1), z_dir=(-1, 0, 0))):
        with BuildLine():
            Line((61.738206335, 184.743272034), (-1.159279863, 184.743272034))
            ThreePointArc((-1.159279863, 184.743272034), (-3.659279863, 182.243272034), (-1.159279863, 179.743272034))
            Line((-1.159279863, 179.743272034), (61.738206335, 179.743272034))
            ThreePointArc((61.738206335, 179.743272034), (64.238206335, 182.243272034), (61.738206335, 184.743272034))
        make_face()
    extrude(amount=-MIRROR1_COPY_2_DEPTH, mode=Mode.SUBTRACT)


solid = part.part
